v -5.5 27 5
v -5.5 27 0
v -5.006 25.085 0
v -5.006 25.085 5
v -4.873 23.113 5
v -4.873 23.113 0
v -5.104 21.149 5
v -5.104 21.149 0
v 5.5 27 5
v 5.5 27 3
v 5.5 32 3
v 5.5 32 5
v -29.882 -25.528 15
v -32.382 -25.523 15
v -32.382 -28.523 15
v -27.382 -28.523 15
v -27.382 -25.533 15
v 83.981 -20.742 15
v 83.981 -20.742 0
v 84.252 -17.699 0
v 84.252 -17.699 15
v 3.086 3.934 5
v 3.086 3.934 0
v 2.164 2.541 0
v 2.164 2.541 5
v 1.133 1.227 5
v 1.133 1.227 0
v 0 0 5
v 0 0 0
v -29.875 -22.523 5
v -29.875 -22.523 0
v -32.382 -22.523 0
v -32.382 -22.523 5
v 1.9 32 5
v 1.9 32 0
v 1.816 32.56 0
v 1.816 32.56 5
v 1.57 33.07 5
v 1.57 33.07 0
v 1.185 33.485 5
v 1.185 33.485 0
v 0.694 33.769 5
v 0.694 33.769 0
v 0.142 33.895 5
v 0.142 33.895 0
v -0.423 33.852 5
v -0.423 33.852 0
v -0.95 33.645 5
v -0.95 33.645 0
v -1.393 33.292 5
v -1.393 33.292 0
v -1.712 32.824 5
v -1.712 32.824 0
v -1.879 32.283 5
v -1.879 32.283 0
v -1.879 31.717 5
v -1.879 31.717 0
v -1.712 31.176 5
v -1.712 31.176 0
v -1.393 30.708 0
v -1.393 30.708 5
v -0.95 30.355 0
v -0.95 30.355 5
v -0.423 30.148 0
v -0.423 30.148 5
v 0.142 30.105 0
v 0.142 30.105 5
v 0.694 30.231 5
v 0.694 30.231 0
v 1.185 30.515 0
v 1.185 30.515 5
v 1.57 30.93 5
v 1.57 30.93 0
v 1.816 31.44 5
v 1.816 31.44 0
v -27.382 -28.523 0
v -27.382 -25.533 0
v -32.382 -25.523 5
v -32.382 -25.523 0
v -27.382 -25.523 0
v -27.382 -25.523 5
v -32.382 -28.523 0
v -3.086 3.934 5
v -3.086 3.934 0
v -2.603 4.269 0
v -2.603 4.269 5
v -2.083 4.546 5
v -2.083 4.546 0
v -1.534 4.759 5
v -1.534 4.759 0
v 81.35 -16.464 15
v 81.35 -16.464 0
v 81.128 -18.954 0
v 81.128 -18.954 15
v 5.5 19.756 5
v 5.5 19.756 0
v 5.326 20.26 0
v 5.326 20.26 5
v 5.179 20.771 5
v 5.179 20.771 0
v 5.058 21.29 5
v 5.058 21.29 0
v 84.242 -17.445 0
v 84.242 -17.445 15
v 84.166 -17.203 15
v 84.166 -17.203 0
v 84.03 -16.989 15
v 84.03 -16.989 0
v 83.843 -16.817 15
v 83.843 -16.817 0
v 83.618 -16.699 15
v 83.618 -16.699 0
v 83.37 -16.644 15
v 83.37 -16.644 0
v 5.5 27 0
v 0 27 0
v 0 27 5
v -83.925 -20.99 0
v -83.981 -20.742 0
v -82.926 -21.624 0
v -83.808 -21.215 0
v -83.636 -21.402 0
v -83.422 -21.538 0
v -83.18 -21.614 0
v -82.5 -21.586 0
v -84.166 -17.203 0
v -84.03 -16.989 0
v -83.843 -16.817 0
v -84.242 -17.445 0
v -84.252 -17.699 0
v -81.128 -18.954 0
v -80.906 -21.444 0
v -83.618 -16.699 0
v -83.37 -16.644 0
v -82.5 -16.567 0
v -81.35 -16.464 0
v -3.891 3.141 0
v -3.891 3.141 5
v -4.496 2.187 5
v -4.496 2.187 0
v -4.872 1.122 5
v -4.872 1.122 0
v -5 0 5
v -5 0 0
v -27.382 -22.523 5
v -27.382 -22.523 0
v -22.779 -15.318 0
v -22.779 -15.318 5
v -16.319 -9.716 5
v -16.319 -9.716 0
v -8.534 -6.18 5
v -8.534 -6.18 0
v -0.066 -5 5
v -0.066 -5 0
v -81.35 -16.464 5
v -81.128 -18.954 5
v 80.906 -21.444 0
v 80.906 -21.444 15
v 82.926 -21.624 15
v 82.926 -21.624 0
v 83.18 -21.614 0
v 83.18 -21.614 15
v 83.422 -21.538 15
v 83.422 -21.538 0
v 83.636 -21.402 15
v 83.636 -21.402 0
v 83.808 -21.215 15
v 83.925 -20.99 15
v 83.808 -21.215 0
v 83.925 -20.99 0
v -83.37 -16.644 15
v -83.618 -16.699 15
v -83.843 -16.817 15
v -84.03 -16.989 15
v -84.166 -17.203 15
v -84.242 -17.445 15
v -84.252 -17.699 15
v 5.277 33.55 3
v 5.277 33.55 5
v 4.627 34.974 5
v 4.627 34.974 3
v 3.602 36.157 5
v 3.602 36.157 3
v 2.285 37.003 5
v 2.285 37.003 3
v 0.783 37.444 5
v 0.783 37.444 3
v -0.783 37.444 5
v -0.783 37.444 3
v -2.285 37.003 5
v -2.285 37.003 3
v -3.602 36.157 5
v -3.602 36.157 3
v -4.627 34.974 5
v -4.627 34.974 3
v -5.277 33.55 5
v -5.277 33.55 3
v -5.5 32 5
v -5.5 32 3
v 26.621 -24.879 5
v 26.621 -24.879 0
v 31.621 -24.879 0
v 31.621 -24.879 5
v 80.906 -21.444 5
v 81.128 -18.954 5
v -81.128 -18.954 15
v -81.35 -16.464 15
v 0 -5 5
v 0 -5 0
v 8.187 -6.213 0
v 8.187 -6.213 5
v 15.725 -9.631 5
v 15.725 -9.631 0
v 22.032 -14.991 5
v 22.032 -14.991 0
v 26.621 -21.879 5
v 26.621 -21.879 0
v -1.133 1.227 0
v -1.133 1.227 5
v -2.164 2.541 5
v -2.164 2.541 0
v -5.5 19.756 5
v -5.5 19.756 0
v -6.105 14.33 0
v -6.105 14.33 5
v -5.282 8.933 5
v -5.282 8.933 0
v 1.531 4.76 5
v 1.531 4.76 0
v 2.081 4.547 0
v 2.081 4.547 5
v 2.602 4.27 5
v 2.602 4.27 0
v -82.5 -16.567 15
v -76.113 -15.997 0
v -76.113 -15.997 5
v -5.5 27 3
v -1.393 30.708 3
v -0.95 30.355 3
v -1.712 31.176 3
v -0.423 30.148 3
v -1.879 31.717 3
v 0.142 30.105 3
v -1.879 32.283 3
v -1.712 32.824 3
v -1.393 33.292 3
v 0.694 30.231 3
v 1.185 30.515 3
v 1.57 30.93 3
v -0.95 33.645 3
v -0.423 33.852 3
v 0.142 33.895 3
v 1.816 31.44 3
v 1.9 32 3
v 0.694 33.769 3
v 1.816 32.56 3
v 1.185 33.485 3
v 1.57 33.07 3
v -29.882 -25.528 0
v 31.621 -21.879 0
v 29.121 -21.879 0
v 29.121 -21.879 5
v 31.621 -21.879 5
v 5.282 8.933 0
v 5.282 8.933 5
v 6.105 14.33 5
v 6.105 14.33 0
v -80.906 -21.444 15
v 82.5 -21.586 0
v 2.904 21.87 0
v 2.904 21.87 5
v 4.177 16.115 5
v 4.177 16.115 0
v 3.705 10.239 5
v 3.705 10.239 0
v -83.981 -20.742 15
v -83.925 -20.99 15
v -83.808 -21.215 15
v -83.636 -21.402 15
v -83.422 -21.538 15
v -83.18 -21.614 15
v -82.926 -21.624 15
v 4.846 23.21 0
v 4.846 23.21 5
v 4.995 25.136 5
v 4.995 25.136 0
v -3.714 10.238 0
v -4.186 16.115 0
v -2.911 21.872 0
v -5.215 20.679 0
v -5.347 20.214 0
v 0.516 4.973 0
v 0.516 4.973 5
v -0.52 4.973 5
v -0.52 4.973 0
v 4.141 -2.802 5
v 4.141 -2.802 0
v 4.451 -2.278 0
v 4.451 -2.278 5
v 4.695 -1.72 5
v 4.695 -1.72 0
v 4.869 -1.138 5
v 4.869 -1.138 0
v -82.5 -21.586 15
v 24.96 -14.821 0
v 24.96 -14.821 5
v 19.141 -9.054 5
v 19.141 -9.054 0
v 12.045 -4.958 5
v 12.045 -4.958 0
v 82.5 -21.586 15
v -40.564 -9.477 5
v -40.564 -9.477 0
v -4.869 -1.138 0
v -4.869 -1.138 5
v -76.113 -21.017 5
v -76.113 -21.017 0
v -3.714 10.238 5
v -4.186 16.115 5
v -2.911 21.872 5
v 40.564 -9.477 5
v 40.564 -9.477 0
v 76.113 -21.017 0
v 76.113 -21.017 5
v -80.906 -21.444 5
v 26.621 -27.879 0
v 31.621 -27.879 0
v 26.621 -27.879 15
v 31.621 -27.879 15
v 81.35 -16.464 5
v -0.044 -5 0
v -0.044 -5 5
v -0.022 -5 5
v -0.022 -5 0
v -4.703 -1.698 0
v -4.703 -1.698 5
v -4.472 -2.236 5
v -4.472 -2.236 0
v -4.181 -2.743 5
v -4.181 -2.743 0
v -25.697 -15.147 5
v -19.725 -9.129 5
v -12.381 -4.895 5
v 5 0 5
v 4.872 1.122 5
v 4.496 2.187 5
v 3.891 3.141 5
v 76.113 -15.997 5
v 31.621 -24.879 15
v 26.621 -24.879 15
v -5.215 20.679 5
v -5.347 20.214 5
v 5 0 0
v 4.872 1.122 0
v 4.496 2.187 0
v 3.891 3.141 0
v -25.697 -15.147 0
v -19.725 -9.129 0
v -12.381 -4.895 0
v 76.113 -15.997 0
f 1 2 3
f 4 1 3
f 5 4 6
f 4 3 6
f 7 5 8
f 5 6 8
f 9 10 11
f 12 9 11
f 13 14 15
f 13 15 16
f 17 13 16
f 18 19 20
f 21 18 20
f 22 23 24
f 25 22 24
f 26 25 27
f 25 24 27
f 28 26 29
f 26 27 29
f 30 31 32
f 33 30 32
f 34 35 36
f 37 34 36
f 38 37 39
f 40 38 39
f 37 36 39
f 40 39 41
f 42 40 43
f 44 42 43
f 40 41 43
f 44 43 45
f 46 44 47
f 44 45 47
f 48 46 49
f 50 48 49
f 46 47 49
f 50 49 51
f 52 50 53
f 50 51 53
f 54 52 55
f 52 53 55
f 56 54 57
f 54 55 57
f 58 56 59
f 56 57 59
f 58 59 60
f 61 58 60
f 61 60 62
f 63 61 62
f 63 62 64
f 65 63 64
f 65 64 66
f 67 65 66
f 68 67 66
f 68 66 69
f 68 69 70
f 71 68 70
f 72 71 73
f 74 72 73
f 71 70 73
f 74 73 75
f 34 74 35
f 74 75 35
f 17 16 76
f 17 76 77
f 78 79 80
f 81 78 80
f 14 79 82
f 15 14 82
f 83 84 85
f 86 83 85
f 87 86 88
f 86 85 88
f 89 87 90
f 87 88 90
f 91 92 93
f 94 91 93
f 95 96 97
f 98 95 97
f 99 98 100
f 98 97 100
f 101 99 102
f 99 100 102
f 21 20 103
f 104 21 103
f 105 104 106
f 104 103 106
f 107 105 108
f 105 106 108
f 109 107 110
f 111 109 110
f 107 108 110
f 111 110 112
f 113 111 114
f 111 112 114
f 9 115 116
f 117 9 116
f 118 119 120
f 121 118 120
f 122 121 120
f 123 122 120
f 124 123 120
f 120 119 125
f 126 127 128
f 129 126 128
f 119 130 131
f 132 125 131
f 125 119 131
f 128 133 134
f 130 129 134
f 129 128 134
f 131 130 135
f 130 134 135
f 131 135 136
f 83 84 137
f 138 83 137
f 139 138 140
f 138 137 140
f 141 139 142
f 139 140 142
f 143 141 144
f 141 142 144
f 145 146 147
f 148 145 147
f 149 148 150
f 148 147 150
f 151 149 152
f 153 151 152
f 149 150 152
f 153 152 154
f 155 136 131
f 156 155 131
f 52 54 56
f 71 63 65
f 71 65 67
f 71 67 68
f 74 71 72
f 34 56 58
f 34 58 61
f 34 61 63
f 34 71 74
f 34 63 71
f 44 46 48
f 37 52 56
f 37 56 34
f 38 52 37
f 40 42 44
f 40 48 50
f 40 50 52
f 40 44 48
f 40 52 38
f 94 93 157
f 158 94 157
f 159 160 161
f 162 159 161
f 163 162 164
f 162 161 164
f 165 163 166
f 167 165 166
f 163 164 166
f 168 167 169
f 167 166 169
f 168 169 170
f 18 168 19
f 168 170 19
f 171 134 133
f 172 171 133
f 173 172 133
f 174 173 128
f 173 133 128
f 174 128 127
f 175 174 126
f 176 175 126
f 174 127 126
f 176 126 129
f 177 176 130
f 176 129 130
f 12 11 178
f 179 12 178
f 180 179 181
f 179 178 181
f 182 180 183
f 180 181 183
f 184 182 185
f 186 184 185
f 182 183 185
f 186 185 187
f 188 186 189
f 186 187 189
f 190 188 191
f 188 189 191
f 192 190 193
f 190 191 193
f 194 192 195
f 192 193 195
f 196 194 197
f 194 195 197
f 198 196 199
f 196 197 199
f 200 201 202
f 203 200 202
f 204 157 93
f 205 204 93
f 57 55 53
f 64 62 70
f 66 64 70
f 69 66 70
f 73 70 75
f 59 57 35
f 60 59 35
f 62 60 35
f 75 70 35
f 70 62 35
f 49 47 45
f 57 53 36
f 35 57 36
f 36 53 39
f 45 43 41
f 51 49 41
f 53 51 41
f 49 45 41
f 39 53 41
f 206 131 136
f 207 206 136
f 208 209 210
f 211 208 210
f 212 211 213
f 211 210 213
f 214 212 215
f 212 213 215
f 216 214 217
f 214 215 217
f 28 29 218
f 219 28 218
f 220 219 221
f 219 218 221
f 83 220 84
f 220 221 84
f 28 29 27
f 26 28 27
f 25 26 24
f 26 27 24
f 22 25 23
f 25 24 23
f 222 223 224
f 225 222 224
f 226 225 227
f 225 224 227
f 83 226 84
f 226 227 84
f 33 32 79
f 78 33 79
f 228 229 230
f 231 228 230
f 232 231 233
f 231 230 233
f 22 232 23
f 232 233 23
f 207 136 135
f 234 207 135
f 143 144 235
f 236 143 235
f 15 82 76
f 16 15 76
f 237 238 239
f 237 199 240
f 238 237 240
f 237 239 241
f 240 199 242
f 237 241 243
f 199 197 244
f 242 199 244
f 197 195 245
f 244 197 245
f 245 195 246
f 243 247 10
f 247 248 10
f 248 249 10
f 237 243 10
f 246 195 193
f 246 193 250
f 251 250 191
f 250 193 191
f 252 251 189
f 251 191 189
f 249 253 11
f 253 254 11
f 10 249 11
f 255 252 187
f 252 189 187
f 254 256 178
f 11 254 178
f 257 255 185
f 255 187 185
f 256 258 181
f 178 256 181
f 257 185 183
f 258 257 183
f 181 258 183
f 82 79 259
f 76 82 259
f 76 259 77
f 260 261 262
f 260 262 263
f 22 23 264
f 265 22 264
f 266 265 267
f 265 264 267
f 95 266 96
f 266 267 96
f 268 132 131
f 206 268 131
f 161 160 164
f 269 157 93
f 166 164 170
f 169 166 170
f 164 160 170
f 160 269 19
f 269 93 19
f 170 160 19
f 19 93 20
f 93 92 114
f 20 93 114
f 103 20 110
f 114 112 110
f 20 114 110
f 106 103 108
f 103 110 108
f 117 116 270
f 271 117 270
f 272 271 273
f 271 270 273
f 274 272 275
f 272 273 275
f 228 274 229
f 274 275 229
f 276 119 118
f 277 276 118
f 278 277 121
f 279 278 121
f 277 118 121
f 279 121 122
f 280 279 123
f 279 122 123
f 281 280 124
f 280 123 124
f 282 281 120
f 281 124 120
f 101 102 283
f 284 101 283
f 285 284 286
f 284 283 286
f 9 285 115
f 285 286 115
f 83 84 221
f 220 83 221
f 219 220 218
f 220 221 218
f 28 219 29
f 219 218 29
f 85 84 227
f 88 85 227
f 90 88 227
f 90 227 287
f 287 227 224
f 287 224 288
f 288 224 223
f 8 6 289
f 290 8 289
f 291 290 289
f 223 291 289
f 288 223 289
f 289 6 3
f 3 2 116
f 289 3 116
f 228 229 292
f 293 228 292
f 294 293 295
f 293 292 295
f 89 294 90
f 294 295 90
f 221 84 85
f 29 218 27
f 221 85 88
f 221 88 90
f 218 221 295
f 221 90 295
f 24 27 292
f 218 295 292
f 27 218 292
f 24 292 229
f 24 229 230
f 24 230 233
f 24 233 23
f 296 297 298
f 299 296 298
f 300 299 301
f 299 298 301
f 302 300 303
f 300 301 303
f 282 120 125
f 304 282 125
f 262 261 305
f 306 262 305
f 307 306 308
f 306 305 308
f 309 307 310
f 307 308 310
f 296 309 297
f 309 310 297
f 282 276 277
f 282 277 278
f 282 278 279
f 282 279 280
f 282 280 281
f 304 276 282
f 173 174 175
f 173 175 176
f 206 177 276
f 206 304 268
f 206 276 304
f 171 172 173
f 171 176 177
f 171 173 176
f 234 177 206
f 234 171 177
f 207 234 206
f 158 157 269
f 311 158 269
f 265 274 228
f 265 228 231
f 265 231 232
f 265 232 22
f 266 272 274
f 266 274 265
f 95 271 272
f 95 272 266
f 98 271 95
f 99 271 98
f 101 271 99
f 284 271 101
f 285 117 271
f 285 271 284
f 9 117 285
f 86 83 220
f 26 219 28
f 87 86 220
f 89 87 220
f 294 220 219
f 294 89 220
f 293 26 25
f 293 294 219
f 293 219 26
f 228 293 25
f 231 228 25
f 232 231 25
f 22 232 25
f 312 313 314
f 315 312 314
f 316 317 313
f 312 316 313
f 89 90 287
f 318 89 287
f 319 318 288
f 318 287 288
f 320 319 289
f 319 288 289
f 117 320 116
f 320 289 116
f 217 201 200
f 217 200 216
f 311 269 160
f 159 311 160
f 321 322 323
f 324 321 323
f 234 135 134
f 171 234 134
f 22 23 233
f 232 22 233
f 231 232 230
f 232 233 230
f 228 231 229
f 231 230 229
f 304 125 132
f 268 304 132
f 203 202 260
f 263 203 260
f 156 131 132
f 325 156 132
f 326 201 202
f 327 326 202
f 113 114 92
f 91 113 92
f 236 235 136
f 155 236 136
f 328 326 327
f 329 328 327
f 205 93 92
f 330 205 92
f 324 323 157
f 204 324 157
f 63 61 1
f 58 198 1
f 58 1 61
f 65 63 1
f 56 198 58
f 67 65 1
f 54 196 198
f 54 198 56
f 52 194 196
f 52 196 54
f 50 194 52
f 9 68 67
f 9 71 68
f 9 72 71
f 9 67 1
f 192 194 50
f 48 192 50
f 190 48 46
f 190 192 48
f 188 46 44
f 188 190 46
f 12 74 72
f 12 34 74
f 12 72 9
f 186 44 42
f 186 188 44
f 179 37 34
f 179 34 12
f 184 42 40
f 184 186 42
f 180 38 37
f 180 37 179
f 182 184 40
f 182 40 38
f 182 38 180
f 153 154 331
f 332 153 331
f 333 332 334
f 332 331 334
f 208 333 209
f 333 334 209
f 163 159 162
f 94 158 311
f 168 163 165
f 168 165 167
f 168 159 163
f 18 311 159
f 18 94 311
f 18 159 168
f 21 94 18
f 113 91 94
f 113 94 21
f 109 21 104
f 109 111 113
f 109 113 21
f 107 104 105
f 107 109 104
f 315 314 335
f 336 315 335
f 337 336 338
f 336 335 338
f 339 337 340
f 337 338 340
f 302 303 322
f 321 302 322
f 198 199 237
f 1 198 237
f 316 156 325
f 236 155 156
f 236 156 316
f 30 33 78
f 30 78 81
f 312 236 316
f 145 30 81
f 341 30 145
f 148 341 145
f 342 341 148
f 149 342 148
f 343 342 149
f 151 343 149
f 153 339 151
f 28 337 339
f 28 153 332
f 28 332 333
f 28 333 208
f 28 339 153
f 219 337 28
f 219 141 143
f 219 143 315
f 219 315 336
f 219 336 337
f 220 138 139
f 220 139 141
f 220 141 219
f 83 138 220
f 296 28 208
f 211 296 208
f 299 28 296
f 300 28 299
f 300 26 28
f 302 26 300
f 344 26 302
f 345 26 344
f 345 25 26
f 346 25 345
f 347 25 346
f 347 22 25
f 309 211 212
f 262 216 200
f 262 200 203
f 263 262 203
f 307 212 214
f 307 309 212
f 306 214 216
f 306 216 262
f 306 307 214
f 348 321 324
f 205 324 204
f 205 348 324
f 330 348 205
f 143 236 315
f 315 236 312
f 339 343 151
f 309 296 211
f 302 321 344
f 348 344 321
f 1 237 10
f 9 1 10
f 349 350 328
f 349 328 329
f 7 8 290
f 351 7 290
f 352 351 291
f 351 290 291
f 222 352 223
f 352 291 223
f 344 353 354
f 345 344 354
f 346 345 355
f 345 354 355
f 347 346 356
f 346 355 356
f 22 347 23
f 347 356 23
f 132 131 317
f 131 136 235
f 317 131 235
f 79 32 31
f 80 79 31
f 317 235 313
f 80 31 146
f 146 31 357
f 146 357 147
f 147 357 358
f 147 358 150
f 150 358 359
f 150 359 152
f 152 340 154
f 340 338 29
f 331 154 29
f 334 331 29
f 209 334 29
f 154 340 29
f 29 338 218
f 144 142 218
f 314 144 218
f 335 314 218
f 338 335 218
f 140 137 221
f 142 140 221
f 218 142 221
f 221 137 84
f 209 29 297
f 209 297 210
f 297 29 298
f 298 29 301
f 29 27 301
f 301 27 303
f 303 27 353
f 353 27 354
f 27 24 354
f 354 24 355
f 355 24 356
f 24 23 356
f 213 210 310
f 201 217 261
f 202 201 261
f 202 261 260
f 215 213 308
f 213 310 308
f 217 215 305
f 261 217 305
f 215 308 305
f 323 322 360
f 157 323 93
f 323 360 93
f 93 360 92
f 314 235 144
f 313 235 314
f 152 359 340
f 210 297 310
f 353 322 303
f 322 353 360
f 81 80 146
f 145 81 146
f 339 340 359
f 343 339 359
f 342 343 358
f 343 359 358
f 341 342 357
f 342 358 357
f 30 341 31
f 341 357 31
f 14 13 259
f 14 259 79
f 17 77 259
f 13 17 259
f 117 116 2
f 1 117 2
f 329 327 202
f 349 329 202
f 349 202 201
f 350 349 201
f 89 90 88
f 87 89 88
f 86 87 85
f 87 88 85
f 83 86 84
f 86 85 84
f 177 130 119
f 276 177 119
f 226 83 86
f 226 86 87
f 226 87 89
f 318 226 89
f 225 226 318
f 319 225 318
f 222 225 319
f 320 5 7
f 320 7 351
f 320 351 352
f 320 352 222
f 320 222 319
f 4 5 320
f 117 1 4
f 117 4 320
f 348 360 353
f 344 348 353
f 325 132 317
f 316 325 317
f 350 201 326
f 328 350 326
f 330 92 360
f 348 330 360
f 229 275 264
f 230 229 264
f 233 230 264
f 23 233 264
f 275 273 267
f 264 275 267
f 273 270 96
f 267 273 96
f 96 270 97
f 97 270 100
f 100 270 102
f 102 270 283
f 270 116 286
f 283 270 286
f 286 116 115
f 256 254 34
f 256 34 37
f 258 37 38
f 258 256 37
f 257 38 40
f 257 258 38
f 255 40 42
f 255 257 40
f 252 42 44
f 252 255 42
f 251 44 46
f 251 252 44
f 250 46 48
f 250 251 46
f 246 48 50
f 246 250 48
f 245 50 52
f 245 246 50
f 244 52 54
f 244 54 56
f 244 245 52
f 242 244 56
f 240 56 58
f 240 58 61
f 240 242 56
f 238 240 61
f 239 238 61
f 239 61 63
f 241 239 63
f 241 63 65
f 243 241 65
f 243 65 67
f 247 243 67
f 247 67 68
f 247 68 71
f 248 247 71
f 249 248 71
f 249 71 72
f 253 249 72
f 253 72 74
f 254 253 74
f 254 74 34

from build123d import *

# Parameters (mm, degrees)
F1_DEPTH = 15
F2_DEPTH = 5
F0_W     = 2.5
F0_H     = 3
F3_DEPTH = 5
F0_R     = 1.9
F4_DEPTH = 5
F5_DEPTH = 5
F6_DEPTH = 3


with BuildPart() as f1:
    # F0 (on Top) → F1 (new body)
    with BuildSketch(Plane.XY):
        with BuildLine():
            Line((-82.5, -21.5863350366), (-82.5, -16.5665013937))
            Line((-82.5, -16.5665013937), (-83.3699967597, -16.6440687753))
            ThreePointArc((-83.3699967597, -16.6440687753), (-84.0295454731, -16.9887980437), (-84.2521564375, -17.6989298148))
            Line((-84.2521564375, -17.6989298148), (-83.9808279356, -20.7421538184))
            ThreePointArc((-83.9808279356, -20.7421538184), (-83.6360986672, -21.4017025318), (-82.9259668961, -21.6243134962))
            Line((-82.9259668961, -21.6243134962), (-82.5, -21.5863350366))
        make_face()
        Polygon((-81.128345354, -18.9541238984), (-81.3503602858, -16.464001538), (-82.5, -16.5665013937), (-82.5, -21.5863350366), (-80.9063304222, -21.4442462589), align=None)
    extrude(amount=F1_DEPTH)


with BuildPart() as f1b:
    # F0 (on Top) → F1, piece 2 (new body)
    with BuildSketch(Plane.XY):
        with BuildLine():
            Line((83.3699963437, -16.6440687785), (82.5, -16.5665014329))
            Line((82.5, -16.5665014329), (82.5, -21.5863350764))
            Line((82.5, -21.5863350764), (82.9259664737, -21.6243134988))
            ThreePointArc((82.9259664737, -21.6243134988), (83.6360982451, -21.4017025353), (83.9808275143, -20.7421538224))
            Line((83.9808275143, -20.7421538224), (84.2521560202, -17.6989298191))
            ThreePointArc((84.2521560202, -17.6989298191), (84.0295450567, -16.9887980477), (83.3699963437, -16.6440687785))
        make_face()
        Polygon((82.5, -16.5665014329), (81.3503598701, -16.4640015386), (81.128344935, -18.9541238987), (80.90633, -21.4442462589), (82.5, -21.5863350764), align=None)
    extrude(amount=F1_DEPTH)


with BuildPart() as f1c:
    # F0 (on Top) → F1, piece 3 (new body)
    with BuildSketch(Plane.XY):
        Polygon((31.6213203436, -24.8786796564), (29.1213203436, -24.8786796564), (26.6213203436, -24.8786796564), (26.6213203436, -27.8786796564), (31.6213203436, -27.8786796564), align=None)
    extrude(amount=F1_DEPTH)


with BuildPart() as f1d:
    # F0 (on Top) → F1, piece 4 (new body)
    with BuildSketch(Plane.XY):
        Polygon((-29.8816396128, -25.5282291926), (-32.3816343716, -25.5231100091), (-32.3816343716, -28.5231100091), (-27.381644854, -28.5231100091), (-27.381644854, -25.5333483762), align=None)
    extrude(amount=F1_DEPTH)


with BuildPart() as f2:
    # F0 (on Top) → F2 (new body)
    with BuildSketch(Plane.XY):
        with BuildLine():
            Line((-2.1337940049, 27), (-5.5, 27))
            ThreePointArc((-5.5, 27), (-4.8940649659, 24.1020455305), (-5.1039532491, 21.1488702426))
            ThreePointArc((-5.1039532491, 21.1488702426), (-3.850388388, 24.1919569907), (-2.1337940049, 27))
        make_face()
        with BuildLine():
            Line((0, 27), (-2.1337940049, 27))
            ThreePointArc((-2.1337940049, 27), (-3.850388388, 24.1919569907), (-5.1039532491, 21.1488702426))
            ThreePointArc((-5.1039532491, 21.1488702426), (-5.278437838, 20.4458640026), (-5.5, 19.7562460986))
            ThreePointArc((-5.5, 19.7562460986), (-5.8710956961, 11.6043025747), (-3.0863215981, 3.9337792252))
            ThreePointArc((-3.0863215981, 3.9337792252), (-2.3467663768, 4.4150523862), (-1.5341266757, 4.7588291988))
            ThreePointArc((-1.5341266757, 4.7588291988), (-4.1864100938, 16.1152704866), (0, 27))
        make_face()
    extrude(amount=F2_DEPTH)


with BuildPart() as f2b:
    # F0 (on Top) → F2, piece 2 (new body)
    with BuildSketch(Plane.XY):
        with BuildLine():
            Line((2.1337940049, 27), (0, 27))
            ThreePointArc((0, 27), (4.1765920633, 16.1147529743), (1.5306162106, 4.7599594553))
            ThreePointArc((1.5306162106, 4.7599594553), (2.3451379758, 4.4159175575), (3.0863215981, 3.9337792252))
            ThreePointArc((3.0863215981, 3.9337792252), (5.8710956961, 11.6043025747), (5.5, 19.7562460986))
            ThreePointArc((5.5, 19.7562460986), (5.2493596136, 20.5144731098), (5.0579844363, 21.289782303))
            ThreePointArc((5.0579844363, 21.289782303), (3.8167255549, 24.2579809722), (2.1337940049, 27))
        make_face()
        with BuildLine():
            Line((5.5, 27), (2.1337940049, 27))
            ThreePointArc((2.1337940049, 27), (3.8167255549, 24.2579809722), (5.0579844363, 21.289782303))
            ThreePointArc((5.0579844363, 21.289782303), (4.8757325261, 24.1761066094), (5.5, 27))
        make_face()
    extrude(amount=F2_DEPTH)


with BuildPart() as f2c:
    # F0 (on Top) → F2, piece 3 (new body)
    with BuildSketch(Plane.XY):
        with BuildLine():
            ThreePointArc((0, 0), (-1.6614515986, 1.8740823074), (-3.0863215981, 3.9337792252))
            ThreePointArc((-3.0863215981, 3.9337792252), (-4.4961988385, 2.1872805043), (-5, 0))
            Line((-5, 0), (0, 0))
        make_face()
        with BuildLine():
            ThreePointArc((5, 0), (4.4961988385, 2.1872805043), (3.0863215981, 3.9337792252))
            ThreePointArc((3.0863215981, 3.9337792252), (1.6614515986, 1.8740823074), (0, 0))
            Line((0, 0), (5, 0))
        make_face()
        with BuildLine():
            Line((0, 0), (-5, 0))
            ThreePointArc((-5, 0), (-4.9671130397, -0.5725277732), (-4.8688847796, -1.137524067))
            Line((-4.8688847796, -1.137524067), (0, 0))
        make_face()
        with BuildLine():
            ThreePointArc((-4.8688847796, -1.137524067), (-4.9671130397, -0.5725277732), (-5, 0))
            Line((-5, 0), (-76.1126271301, -15.9970144582))
            Line((-76.1126271301, -15.9970144582), (-76.1126271301, -17.7822949373))
            Line((-76.1126271301, -17.7822949373), (-40.564172677, -9.4770619492))
            Line((-40.564172677, -9.4770619492), (-4.8688847796, -1.137524067))
        make_face()
        with BuildLine():
            Line((5, 0), (0, 0))
            Line((0, 0), (4.8688847783, -1.1375240726))
            ThreePointArc((4.8688847783, -1.1375240726), (4.9671130394, -0.572527776), (5, 0))
        make_face()
        with BuildLine():
            Line((0, -2.5), (0, 0))
            Line((0, 0), (-4.8688847796, -1.137524067))
            ThreePointArc((-4.8688847796, -1.137524067), (-4.5953849074, -1.9703902031), (-4.1806287521, -2.7426890522))
            ThreePointArc((-4.1806287521, -2.7426890522), (-2.0942964003, -2.5527490751), (0, -2.5))
        make_face()
        with BuildLine():
            Line((4.8688847783, -1.1375240726), (0, 0))
            Line((0, 0), (0, -2.5))
            ThreePointArc((0, -2.5), (2.0756234829, -2.5833806697), (4.1414358733, -2.8015190356))
            ThreePointArc((4.1414358733, -2.8015190356), (4.5813414379, -2.0028256613), (4.8688847783, -1.1375240726))
        make_face()
        with BuildLine():
            Line((76.1126265372, -15.9970144361), (5, 0))
            ThreePointArc((5, 0), (4.9671130394, -0.572527776), (4.8688847783, -1.1375240726))
            Line((4.8688847783, -1.1375240726), (40.5641724675, -9.4770619494))
            Line((40.5641724675, -9.4770619494), (76.1126265372, -17.7822948909))
            Line((76.1126265372, -17.7822948909), (76.1126265372, -15.9970144361))
        make_face()
        Polygon((-76.1126271301, -17.7822949373), (-76.1126271301, -15.9970144582), (-81.3503602858, -16.464001538), (-81.128345354, -18.9541238984), align=None)
        with BuildLine():
            ThreePointArc((4.1414358733, -2.8015190356), (2.0756234829, -2.5833806697), (0, -2.5))
            Line((0, -2.5), (0, -5))
            ThreePointArc((0, -5), (2.3443980914, -4.4163104045), (4.1414358733, -2.8015190356))
        make_face()
        with BuildLine():
            Line((0, -5), (0, -2.5))
            ThreePointArc((0, -2.5), (-2.0942964003, -2.5527490751), (-4.1806287521, -2.7426890522))
            ThreePointArc((-4.1806287521, -2.7426890522), (-2.4045705015, -4.3838385809), (-0.0660587142, -4.9995636056))
            ThreePointArc((-0.0660587142, -4.9995636056), (-0.0330300778, -4.9998909002), (0, -5))
        make_face()
        Polygon((81.3503598701, -16.4640015386), (76.1126265372, -15.9970144361), (76.1126265372, -17.7822948909), (81.128344935, -18.9541238987), align=None)
        with BuildLine():
            ThreePointArc((-0.0660587142, -4.9995636056), (-2.4045705015, -4.3838385809), (-4.1806287521, -2.7426890522))
            ThreePointArc((-4.1806287521, -2.7426890522), (-19.7252165616, -9.1292774686), (-29.8754860972, -22.5231100091))
            Line((-29.8754860972, -22.5231100091), (-27.381644854, -22.5231100091))
            ThreePointArc((-27.381644854, -22.5231100091), (-16.318878423, -9.7162267561), (-0.0660587142, -4.9995636056))
        make_face()
        Polygon((-76.1126271301, -21.0168481011), (-40.564172677, -9.4770619492), (-76.1126271301, -17.7822949373), align=None)
        Polygon((-76.1126271301, -21.0168481011), (-76.1126271301, -17.7822949373), (-81.128345354, -18.9541238984), (-80.9063304222, -21.4442462589), align=None)
        with BuildLine():
            ThreePointArc((29.1213203436, -21.8786796564), (19.1406778811, -9.0543892937), (4.1414358733, -2.8015190356))
            ThreePointArc((4.1414358733, -2.8015190356), (2.3443980914, -4.4163104045), (0, -5))
            ThreePointArc((0, -5), (15.7253308616, -9.6308830492), (26.6213203436, -21.8786796564))
            Line((26.6213203436, -21.8786796564), (29.1213203436, -21.8786796564))
        make_face()
        Polygon((76.1126265372, -17.7822948909), (40.5641724675, -9.4770619494), (76.1126265372, -21.0168480796), align=None)
        Polygon((81.128344935, -18.9541238987), (76.1126265372, -17.7822948909), (76.1126265372, -21.0168480796), (80.90633, -21.4442462589), align=None)
        Polygon((-29.8816291304, -25.5231100091), (-29.8754860972, -22.5231100091), (-32.3816343716, -22.5231100091), (-32.3816343716, -25.5231100091), align=None)
        Polygon((-27.381644854, -22.5231100091), (-29.8754860972, -22.5231100091), (-29.8816291304, -25.5231100091), (-27.381644854, -25.5231100091), align=None)
        with Locations((27.8713203436, -23.3786796564)):
            Rectangle(F0_W, F0_H)
        with Locations((30.3713203436, -23.3786796564)):
            Rectangle(F0_W, F0_H)
    extrude(amount=F2_DEPTH)


with BuildPart() as f3:
    # F0 (on Top) → F3 (new body)
    with BuildSketch(Plane.XY):
        with BuildLine():
            ThreePointArc((0, 2.5), (0.8041462109, 3.6036756124), (1.5306162106, 4.7599594553))
            ThreePointArc((1.5306162106, 4.7599594553), (-0.0018439661, 4.99999966), (-1.5341266757, 4.7588291988))
            ThreePointArc((-1.5341266757, 4.7588291988), (-0.8059688668, 3.6029911718), (0, 2.5))
        make_face()
        with BuildLine():
            ThreePointArc((3.0863215981, 3.9337792252), (2.3451379758, 4.4159175575), (1.5306162106, 4.7599594553))
            ThreePointArc((1.5306162106, 4.7599594553), (0.8041462109, 3.6036756124), (0, 2.5))
            ThreePointArc((0, 2.5), (-0.8059688668, 3.6029911718), (-1.5341266757, 4.7588291988))
            ThreePointArc((-1.5341266757, 4.7588291988), (-2.3467663768, 4.4150523862), (-3.0863215981, 3.9337792252))
            ThreePointArc((-3.0863215981, 3.9337792252), (-1.6614515986, 1.8740823074), (0, 0))
            ThreePointArc((0, 0), (1.6614515986, 1.8740823074), (3.0863215981, 3.9337792252))
        make_face()
    extrude(amount=F3_DEPTH)


with BuildPart() as f4:
    # F0 (on Top) → F4 (new body)
    with BuildSketch(Plane.XY):
        with Locations((0, 32)):
            Circle(F0_R)
    extrude(amount=F4_DEPTH)


with BuildPart() as f5:
    # F0 (on Top) → F5 (new body)
    with BuildSketch(Plane.XY):
        with BuildLine():
            Line((-5.5, 32), (-5.5, 27))
            Line((-5.5, 27), (-2.1337940049, 27))
            ThreePointArc((-2.1337940049, 27), (-1.1162134987, 28.2920924976), (0, 29.5))
            ThreePointArc((0, 29.5), (1.1162134987, 28.2920924976), (2.1337940049, 27))
            Line((2.1337940049, 27), (5.5, 27))
            Line((5.5, 27), (5.5, 32))
            ThreePointArc((5.5, 32), (0, 37.5), (-5.5, 32))
        make_face()
        with Locations((0, 32)):
            Circle(F0_R, mode=Mode.SUBTRACT)
        with BuildLine():
            ThreePointArc((0, 29.5), (-1.1162134987, 28.2920924976), (-2.1337940049, 27))
            Line((-2.1337940049, 27), (0, 27))
            Line((0, 27), (2.1337940049, 27))
            ThreePointArc((2.1337940049, 27), (1.1162134987, 28.2920924976), (0, 29.5))
        make_face()
    extrude(amount=F5_DEPTH)

    # F0 (on Top) → F6 (cut)
    with BuildSketch(Plane.XY):
        with BuildLine():
            Line((-5.5, 32), (-5.5, 27))
            Line((-5.5, 27), (-2.1337940049, 27))
            ThreePointArc((-2.1337940049, 27), (-1.1162134987, 28.2920924976), (0, 29.5))
            ThreePointArc((0, 29.5), (1.1162134987, 28.2920924976), (2.1337940049, 27))
            Line((2.1337940049, 27), (5.5, 27))
            Line((5.5, 27), (5.5, 32))
            ThreePointArc((5.5, 32), (0, 37.5), (-5.5, 32))
        make_face()
        with Locations((0, 32)):
            Circle(F0_R, mode=Mode.SUBTRACT)
        with BuildLine():
            ThreePointArc((0, 29.5), (-1.1162134987, 28.2920924976), (-2.1337940049, 27))
            Line((-2.1337940049, 27), (0, 27))
            Line((0, 27), (2.1337940049, 27))
            ThreePointArc((2.1337940049, 27), (1.1162134987, 28.2920924976), (0, 29.5))
        make_face()
    extrude(amount=F6_DEPTH, mode=Mode.SUBTRACT)


solid = Compound([f1.part, f1b.part, f1c.part, f1d.part, f2.part, f2b.part, f2c.part, f3.part, f4.part, f5.part])
